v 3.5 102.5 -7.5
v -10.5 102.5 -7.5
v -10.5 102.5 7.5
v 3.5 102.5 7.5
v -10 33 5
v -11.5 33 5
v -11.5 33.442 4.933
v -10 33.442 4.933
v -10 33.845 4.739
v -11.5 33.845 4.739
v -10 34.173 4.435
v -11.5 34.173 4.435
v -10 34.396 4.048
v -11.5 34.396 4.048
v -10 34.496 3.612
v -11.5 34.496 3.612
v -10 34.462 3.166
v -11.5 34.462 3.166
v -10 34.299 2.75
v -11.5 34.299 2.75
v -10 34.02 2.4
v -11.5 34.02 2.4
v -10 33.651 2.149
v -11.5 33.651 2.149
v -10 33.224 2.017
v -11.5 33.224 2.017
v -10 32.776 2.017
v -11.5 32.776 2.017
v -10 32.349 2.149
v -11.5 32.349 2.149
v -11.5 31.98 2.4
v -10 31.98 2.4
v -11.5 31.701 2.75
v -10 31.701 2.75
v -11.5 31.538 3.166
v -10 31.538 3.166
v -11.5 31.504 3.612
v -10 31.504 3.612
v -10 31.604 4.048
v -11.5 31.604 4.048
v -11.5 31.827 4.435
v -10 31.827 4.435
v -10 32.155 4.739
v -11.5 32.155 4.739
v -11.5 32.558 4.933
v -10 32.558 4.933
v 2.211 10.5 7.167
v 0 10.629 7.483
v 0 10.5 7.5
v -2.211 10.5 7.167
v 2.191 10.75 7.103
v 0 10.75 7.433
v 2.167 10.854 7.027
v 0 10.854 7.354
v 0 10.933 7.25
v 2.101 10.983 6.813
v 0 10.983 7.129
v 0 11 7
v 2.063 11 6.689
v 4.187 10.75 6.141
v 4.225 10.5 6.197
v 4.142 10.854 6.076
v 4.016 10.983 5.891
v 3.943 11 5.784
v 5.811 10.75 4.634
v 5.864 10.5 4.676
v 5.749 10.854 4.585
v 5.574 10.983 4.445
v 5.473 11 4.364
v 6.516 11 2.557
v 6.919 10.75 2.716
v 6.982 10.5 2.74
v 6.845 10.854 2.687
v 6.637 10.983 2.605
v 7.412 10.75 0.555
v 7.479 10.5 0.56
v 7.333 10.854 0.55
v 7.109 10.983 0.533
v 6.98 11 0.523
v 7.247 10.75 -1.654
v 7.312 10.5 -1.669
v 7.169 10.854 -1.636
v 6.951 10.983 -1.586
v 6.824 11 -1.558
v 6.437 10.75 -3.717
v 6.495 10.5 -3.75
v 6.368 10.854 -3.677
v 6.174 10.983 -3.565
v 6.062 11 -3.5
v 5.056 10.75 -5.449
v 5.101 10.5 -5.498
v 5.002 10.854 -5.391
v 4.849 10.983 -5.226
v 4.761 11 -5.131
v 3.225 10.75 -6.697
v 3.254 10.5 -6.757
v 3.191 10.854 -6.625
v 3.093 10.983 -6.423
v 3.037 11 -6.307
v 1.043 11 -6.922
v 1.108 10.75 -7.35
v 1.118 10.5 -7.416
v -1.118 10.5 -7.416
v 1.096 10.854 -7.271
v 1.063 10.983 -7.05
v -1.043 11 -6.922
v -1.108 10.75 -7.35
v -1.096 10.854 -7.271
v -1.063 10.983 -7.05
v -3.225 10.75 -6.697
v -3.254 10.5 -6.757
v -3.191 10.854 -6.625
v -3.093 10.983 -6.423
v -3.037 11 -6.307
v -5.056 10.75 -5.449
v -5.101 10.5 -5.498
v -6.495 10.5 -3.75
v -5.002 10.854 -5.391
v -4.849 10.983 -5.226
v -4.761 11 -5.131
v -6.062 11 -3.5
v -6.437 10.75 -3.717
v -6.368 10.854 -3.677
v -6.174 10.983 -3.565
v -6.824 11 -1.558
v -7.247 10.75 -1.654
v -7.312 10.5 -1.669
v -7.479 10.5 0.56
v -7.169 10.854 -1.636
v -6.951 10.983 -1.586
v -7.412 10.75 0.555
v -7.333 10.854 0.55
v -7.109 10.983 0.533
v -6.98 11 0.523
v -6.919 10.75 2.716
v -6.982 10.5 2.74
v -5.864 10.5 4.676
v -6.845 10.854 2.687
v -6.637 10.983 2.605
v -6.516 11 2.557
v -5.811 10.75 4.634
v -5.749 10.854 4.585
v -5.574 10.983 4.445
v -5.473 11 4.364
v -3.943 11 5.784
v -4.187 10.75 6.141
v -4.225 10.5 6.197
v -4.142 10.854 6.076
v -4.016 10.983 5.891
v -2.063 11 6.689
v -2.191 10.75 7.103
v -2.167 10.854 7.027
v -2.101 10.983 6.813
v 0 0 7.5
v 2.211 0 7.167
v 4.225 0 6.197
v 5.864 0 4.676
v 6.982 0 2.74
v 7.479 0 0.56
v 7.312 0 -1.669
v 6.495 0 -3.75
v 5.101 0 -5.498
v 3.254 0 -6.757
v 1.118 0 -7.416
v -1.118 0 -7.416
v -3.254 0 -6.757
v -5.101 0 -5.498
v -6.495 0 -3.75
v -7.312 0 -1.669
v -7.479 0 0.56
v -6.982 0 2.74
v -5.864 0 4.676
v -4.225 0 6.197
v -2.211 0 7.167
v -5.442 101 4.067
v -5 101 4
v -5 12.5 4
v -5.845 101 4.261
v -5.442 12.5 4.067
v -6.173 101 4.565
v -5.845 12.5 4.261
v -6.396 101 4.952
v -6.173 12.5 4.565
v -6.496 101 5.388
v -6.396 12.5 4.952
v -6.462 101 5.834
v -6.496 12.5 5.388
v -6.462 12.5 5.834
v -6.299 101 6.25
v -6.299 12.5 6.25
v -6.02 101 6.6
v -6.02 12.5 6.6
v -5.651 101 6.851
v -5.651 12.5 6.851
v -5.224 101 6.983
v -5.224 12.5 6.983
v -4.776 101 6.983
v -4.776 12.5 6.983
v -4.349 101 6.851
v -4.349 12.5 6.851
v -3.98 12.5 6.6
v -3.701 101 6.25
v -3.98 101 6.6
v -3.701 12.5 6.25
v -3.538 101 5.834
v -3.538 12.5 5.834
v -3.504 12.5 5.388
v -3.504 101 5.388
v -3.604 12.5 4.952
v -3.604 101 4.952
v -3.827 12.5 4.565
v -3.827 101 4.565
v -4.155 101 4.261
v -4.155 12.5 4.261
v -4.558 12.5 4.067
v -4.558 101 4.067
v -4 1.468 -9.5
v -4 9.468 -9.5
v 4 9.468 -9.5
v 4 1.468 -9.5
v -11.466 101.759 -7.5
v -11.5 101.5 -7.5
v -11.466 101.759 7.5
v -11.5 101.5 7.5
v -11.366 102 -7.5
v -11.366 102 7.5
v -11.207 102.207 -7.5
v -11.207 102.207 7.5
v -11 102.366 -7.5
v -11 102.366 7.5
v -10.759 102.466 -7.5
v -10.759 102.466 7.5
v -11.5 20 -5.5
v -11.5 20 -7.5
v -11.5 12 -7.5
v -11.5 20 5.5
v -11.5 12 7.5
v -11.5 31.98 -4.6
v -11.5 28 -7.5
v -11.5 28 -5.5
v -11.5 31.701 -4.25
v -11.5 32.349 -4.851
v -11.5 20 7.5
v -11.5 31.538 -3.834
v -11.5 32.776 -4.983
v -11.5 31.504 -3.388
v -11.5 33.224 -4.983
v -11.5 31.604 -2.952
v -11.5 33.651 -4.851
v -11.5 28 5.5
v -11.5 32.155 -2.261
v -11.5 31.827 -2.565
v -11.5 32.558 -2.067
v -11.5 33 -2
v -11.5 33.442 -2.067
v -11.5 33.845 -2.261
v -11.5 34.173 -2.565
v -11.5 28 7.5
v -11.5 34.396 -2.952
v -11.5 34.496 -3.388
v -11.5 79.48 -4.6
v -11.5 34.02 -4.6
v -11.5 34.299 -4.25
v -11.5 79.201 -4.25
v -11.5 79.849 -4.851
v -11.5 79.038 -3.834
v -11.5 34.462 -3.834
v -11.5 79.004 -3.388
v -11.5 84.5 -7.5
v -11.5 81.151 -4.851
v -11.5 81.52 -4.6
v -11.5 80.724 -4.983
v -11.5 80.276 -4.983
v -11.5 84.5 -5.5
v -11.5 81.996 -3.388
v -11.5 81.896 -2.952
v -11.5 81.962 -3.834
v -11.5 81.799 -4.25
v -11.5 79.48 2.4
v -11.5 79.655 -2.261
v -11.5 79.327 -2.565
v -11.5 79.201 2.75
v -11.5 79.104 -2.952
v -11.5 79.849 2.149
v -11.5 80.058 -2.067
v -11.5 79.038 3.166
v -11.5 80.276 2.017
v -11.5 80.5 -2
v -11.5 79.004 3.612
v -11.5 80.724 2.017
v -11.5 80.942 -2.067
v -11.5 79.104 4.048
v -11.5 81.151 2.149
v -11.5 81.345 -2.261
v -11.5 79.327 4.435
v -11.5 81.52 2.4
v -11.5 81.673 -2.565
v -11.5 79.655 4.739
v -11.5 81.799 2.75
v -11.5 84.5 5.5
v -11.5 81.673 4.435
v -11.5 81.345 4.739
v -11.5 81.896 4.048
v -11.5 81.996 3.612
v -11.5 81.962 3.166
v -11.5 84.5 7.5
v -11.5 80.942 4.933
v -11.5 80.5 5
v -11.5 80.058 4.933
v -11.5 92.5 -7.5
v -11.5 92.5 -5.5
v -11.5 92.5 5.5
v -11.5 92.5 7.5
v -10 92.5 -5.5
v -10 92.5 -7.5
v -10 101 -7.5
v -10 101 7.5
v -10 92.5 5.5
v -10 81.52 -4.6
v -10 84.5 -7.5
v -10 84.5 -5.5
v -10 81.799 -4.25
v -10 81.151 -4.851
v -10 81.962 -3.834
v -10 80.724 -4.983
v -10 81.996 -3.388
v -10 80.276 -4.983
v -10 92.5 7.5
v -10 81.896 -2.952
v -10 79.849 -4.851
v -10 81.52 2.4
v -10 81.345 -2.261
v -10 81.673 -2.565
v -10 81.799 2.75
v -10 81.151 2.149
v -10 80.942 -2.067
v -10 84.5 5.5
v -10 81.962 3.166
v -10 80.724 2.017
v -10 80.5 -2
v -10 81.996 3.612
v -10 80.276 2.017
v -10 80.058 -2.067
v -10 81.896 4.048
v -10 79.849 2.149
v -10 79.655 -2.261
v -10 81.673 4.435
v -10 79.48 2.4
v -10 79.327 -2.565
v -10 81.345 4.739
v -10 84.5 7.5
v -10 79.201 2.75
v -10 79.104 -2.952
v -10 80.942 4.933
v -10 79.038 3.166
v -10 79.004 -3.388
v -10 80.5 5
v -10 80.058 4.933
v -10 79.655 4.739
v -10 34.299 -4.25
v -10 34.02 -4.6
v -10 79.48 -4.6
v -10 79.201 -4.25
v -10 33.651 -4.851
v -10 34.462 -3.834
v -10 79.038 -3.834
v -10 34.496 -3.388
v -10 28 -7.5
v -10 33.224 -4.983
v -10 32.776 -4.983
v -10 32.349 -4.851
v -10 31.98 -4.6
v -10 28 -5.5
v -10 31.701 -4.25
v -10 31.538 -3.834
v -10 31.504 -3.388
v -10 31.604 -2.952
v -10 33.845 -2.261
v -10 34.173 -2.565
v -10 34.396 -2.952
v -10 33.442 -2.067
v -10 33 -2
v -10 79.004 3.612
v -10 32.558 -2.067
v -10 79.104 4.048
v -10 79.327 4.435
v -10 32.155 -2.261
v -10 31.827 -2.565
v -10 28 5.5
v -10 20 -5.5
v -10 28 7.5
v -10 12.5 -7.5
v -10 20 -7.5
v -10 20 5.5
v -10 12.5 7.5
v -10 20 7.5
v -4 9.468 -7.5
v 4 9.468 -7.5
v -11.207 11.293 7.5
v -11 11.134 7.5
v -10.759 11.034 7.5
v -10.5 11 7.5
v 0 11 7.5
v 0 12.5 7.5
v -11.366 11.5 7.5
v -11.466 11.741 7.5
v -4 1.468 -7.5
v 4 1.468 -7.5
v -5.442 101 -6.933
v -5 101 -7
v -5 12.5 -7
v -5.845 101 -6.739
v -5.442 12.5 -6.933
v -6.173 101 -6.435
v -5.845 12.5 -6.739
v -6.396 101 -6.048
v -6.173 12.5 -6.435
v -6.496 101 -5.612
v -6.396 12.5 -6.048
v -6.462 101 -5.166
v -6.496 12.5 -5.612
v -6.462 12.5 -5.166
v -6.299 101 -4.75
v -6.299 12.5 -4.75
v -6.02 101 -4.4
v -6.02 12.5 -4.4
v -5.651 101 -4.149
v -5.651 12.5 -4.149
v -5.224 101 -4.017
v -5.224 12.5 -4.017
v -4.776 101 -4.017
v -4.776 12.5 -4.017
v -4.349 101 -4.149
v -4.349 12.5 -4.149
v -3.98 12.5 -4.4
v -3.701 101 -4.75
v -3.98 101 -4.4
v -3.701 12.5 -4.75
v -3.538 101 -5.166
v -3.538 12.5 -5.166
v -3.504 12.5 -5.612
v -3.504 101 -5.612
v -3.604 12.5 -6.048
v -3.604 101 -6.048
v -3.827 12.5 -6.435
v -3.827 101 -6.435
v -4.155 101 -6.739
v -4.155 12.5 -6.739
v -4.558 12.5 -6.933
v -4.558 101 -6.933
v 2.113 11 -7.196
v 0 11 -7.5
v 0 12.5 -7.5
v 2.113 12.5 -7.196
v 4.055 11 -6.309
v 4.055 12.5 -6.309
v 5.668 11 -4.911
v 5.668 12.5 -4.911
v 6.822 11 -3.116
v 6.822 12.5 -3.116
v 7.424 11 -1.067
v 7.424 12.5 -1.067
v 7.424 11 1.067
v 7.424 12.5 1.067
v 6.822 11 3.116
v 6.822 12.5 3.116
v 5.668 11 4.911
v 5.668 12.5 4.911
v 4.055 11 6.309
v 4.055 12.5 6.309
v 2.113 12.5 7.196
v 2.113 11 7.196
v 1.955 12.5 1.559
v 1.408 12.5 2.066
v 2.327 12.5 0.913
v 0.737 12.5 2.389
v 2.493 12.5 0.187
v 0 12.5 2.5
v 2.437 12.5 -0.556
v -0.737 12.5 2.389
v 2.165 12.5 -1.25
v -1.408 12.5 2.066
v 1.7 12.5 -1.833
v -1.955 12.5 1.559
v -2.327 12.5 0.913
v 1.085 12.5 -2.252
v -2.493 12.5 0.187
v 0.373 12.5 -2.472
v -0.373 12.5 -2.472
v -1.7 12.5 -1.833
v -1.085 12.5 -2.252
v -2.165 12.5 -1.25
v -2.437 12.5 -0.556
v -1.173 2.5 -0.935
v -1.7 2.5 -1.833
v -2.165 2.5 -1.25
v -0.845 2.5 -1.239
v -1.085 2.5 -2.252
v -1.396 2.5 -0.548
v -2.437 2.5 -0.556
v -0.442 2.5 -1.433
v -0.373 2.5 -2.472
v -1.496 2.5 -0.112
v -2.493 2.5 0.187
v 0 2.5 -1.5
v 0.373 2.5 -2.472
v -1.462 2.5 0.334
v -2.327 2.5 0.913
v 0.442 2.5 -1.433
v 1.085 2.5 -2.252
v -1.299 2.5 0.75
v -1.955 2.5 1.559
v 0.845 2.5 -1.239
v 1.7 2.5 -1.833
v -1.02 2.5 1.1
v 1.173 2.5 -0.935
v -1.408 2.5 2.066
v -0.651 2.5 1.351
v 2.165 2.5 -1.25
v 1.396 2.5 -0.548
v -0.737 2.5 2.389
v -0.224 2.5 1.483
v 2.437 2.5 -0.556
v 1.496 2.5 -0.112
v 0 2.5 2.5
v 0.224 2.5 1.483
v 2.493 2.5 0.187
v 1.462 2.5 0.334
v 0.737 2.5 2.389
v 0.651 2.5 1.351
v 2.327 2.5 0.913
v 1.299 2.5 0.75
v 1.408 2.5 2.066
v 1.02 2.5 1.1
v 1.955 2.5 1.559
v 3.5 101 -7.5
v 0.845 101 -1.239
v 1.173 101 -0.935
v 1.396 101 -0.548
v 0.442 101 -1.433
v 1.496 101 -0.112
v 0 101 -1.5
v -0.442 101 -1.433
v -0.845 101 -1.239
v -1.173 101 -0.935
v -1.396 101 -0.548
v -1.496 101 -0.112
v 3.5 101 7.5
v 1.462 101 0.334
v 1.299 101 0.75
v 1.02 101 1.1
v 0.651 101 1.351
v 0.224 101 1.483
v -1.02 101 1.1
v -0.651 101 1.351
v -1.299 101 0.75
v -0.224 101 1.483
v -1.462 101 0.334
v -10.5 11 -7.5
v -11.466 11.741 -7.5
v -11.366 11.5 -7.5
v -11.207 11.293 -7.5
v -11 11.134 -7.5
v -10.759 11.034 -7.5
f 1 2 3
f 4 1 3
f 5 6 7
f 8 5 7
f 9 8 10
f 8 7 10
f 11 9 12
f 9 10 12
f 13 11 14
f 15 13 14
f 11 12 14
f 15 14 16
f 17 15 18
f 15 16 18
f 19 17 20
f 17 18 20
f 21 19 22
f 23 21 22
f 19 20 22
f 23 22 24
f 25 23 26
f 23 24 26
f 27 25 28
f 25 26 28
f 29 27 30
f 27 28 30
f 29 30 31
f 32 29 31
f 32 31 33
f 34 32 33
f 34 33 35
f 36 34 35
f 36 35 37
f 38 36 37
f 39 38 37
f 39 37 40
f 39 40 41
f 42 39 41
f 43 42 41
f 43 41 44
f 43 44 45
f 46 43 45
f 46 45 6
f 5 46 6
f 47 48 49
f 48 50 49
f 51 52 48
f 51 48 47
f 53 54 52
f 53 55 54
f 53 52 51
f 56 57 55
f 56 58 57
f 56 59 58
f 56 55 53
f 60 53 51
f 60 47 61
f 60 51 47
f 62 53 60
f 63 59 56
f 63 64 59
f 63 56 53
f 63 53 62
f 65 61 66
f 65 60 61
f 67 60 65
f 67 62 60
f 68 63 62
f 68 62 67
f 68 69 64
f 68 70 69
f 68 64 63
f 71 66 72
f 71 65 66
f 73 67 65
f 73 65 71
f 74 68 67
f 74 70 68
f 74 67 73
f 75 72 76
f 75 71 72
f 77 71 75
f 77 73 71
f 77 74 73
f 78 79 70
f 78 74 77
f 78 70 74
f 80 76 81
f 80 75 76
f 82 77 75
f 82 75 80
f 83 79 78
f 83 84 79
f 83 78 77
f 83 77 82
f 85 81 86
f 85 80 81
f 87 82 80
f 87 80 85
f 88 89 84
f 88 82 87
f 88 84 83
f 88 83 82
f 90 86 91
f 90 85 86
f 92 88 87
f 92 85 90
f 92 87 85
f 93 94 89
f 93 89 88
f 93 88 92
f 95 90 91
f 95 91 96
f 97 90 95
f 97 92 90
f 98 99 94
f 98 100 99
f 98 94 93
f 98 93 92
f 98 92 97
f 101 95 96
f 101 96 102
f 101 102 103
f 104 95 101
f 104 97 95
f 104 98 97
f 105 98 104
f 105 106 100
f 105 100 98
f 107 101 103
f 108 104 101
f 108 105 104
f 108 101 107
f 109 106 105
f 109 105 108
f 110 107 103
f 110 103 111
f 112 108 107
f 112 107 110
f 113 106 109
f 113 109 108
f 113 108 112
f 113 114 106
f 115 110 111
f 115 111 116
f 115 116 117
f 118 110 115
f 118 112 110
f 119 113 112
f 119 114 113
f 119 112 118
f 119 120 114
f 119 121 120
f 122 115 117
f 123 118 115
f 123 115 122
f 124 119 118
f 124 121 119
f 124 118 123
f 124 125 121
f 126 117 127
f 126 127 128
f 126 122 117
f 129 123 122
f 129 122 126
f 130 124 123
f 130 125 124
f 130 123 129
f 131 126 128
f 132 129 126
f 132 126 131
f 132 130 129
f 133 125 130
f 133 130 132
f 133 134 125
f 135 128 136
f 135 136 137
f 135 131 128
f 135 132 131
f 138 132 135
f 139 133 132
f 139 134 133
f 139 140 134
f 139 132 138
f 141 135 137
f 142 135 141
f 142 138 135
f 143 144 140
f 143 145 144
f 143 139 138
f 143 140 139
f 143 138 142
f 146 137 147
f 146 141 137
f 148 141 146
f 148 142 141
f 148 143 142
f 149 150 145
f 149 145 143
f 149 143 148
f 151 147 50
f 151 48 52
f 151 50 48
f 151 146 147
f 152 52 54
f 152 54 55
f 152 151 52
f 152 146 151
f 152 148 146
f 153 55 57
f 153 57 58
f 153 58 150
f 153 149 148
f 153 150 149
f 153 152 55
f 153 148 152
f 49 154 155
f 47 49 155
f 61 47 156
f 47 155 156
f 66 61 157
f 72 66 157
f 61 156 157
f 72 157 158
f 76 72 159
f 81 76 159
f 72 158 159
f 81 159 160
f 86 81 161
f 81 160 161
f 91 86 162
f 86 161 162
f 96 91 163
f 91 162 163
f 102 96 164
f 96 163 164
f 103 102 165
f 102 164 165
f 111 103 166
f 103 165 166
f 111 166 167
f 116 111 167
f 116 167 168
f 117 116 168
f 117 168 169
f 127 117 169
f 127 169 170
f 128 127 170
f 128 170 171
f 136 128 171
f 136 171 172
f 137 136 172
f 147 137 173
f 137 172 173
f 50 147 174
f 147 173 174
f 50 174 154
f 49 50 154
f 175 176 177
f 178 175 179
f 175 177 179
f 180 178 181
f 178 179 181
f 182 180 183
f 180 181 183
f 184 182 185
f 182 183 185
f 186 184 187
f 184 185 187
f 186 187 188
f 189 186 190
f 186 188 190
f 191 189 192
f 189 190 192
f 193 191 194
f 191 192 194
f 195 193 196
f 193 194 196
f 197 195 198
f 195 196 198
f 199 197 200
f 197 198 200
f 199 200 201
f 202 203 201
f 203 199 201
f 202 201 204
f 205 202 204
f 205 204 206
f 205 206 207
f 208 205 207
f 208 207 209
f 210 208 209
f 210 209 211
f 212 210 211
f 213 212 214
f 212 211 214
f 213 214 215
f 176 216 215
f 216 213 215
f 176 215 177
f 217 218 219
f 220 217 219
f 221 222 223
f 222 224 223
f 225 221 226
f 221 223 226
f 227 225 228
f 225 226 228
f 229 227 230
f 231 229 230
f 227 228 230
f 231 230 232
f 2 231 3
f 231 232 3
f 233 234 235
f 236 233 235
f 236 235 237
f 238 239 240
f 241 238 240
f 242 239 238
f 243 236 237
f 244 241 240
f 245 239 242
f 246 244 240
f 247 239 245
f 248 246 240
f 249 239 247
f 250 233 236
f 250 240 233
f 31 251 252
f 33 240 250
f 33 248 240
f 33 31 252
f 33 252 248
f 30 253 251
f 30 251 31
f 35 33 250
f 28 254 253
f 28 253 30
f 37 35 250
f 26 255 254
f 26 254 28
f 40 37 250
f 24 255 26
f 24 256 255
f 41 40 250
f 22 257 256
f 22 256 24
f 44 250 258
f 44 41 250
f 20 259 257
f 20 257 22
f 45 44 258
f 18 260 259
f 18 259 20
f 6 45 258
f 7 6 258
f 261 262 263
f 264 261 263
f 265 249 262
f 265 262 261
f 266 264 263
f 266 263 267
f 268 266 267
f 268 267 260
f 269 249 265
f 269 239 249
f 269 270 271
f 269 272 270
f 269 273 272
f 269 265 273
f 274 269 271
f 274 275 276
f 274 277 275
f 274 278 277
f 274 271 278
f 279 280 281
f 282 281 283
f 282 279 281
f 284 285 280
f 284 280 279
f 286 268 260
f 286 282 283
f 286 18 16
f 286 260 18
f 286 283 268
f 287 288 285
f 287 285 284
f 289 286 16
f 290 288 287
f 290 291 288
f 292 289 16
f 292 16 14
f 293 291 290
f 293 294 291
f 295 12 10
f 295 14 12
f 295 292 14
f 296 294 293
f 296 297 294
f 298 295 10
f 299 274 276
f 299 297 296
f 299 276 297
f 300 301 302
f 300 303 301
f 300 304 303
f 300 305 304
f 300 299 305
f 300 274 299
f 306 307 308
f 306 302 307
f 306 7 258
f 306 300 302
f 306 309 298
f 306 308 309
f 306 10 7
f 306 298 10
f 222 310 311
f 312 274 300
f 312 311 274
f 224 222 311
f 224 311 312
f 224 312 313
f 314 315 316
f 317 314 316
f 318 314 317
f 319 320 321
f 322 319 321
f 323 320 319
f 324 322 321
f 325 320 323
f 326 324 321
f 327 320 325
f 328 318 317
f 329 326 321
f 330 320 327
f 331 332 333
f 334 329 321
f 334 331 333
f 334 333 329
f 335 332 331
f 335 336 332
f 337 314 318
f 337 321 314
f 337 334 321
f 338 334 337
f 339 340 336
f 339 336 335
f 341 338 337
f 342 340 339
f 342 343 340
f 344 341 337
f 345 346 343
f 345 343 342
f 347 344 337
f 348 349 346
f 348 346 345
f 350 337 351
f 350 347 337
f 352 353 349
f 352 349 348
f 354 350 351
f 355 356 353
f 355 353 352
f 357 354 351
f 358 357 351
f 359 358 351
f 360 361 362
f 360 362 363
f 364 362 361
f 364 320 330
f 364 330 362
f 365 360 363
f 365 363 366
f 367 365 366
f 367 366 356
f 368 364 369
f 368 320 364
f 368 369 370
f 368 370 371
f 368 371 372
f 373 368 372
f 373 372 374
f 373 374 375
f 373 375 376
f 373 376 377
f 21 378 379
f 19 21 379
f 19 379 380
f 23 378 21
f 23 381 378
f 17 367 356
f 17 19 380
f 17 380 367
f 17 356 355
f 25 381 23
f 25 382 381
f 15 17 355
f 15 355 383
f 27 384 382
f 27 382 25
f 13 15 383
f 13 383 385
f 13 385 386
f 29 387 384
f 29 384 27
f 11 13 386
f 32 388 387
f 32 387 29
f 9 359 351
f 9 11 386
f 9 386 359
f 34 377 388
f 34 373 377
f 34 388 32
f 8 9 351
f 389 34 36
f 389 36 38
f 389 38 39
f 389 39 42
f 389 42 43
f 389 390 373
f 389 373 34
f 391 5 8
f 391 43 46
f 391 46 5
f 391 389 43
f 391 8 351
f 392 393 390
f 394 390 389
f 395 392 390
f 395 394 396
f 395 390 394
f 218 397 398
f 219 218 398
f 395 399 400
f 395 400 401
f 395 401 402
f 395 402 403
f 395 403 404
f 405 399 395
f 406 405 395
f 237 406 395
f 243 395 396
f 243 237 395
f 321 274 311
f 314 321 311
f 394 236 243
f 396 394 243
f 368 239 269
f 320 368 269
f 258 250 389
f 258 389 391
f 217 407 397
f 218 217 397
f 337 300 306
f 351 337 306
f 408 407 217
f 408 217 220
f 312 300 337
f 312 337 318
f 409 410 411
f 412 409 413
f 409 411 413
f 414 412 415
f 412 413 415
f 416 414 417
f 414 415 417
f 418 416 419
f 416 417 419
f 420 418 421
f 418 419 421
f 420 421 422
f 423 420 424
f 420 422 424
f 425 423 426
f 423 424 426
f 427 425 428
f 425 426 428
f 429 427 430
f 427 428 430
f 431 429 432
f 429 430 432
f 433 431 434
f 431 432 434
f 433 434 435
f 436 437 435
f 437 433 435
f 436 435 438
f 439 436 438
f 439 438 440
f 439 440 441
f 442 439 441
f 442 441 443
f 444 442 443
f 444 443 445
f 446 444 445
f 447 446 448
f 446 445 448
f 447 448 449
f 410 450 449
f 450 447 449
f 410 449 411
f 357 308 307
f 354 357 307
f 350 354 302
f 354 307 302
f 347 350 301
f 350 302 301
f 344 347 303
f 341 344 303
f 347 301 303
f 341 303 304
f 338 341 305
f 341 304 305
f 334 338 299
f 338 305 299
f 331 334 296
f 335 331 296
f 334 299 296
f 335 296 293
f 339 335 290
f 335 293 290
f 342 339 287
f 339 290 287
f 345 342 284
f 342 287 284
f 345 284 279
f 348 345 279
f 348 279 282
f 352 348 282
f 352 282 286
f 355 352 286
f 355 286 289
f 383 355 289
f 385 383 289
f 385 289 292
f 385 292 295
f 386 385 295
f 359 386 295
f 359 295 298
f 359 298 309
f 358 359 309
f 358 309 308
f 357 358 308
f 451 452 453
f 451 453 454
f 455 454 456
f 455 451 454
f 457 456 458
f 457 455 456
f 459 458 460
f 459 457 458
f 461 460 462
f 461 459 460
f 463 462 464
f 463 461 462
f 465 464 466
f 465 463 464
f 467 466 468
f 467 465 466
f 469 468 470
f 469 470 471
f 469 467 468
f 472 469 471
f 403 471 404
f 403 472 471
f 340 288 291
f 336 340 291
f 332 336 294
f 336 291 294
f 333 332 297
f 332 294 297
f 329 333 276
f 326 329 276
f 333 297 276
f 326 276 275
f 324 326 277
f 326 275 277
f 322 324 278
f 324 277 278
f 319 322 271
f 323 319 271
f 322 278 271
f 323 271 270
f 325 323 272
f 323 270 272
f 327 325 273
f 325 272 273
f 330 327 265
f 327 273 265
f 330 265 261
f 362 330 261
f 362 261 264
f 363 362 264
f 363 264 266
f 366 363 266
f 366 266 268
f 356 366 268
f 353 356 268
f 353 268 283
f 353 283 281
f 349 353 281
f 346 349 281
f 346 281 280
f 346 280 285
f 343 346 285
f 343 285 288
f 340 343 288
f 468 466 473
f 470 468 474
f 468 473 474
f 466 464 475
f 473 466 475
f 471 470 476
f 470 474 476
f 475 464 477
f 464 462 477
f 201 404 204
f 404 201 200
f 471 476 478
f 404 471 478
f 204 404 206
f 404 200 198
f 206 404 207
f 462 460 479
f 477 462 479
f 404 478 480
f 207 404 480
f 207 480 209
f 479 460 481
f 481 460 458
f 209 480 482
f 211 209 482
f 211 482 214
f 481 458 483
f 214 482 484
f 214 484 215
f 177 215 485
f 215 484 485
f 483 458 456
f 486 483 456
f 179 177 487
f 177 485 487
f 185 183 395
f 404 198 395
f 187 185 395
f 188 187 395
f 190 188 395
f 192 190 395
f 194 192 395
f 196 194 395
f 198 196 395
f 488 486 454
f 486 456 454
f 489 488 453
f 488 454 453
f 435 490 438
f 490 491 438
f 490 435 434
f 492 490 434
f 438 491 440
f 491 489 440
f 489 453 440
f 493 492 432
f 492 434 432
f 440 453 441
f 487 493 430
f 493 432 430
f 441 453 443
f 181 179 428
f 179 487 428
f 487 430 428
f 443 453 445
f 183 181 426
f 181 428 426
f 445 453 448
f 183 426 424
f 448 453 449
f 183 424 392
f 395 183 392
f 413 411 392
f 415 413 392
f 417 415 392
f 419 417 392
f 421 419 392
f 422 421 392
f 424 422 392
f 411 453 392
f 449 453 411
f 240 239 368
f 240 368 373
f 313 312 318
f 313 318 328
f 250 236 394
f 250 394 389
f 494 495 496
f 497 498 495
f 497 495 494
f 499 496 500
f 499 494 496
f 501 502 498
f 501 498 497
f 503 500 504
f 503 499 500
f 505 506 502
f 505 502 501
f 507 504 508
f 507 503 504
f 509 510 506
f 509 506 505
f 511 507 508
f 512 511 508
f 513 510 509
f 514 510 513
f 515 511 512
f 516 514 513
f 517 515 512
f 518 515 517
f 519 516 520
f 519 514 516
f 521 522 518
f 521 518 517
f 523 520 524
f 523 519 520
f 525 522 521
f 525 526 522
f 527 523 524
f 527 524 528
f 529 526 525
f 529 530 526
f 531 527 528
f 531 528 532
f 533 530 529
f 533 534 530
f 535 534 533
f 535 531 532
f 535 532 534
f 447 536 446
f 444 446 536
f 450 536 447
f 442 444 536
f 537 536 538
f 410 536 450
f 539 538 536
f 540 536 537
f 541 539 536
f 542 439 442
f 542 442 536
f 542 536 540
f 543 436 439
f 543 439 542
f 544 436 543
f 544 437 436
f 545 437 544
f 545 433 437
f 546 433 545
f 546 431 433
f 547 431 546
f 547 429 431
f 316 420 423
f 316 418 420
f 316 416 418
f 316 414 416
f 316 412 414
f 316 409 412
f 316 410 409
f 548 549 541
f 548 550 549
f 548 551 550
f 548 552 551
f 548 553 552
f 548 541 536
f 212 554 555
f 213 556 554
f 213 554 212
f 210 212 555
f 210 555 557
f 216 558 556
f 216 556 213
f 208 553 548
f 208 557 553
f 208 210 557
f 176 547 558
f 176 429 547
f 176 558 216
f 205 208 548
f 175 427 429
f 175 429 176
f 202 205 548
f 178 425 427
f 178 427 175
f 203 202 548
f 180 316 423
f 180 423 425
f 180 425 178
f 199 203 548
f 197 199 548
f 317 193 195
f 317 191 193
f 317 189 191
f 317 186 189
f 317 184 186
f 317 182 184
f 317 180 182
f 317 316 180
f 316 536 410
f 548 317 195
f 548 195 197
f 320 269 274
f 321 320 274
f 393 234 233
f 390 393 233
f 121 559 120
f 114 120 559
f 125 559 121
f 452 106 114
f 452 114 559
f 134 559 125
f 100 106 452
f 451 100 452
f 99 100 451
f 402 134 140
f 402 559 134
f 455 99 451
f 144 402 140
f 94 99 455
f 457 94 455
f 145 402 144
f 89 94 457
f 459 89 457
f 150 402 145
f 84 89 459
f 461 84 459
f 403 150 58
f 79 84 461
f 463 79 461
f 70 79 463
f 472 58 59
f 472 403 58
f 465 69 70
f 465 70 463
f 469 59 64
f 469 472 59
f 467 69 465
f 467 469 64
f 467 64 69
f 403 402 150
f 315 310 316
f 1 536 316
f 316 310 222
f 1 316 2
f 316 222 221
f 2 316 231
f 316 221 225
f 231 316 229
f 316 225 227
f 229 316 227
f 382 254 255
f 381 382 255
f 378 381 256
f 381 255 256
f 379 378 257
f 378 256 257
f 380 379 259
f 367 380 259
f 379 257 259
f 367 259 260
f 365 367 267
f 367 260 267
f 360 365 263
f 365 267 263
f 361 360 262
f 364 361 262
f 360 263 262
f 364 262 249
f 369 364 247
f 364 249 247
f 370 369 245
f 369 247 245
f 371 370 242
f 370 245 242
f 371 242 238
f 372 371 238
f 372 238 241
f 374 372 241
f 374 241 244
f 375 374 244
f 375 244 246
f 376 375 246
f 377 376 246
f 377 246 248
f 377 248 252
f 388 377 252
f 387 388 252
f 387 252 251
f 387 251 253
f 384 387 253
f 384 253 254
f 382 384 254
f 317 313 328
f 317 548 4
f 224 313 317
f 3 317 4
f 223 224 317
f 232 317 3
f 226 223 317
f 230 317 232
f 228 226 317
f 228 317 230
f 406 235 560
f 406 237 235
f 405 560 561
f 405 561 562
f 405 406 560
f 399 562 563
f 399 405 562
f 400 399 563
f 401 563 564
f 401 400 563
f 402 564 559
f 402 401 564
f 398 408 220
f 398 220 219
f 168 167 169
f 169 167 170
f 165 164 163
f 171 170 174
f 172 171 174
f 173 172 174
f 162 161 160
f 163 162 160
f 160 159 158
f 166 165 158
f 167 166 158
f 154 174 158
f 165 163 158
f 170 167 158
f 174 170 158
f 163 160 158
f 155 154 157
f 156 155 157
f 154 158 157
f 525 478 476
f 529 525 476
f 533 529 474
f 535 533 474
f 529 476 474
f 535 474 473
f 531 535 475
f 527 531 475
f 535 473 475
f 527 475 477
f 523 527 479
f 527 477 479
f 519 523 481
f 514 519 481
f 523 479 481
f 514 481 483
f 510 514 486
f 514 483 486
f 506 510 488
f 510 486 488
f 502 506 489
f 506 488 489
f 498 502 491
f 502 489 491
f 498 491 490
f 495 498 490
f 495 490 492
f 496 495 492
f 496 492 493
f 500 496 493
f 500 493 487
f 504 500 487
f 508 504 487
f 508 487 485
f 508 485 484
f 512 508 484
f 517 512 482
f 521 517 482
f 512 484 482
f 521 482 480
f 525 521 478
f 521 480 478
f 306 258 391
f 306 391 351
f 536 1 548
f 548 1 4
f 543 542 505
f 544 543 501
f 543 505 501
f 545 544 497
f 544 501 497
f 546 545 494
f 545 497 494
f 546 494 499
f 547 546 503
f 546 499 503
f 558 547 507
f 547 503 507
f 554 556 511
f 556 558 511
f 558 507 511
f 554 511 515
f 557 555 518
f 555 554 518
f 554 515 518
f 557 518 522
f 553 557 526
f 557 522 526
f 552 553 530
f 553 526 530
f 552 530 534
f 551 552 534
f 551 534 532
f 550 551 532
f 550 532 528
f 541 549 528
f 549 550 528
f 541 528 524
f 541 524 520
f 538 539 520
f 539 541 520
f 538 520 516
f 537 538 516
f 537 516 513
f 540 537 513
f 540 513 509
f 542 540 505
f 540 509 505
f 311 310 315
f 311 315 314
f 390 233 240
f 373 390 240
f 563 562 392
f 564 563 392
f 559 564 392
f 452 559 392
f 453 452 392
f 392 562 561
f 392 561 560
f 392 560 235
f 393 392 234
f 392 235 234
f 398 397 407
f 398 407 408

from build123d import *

# Parameters (mm, degrees)
SKETCH1_R           = 7.5
BOSS_EXTRUDE1_DEPTH = 11
FILLET1_R           = 0.5
BOSS_EXTRUDE2_DEPTH = 1.5
SKETCH5_W           = 1.5
SKETCH5_H           = 15
BOSS_EXTRUDE3_DEPTH = 90
FILLET2_R           = 1
SKETCH7_W           = 15
SKETCH7_H           = 1.5
BOSS_EXTRUDE4_DEPTH = 15
FILLET3_R           = 1
SKETCH8_R           = 2.5
CUT_EXTRUDE1_DEPTH  = 10
SKETCH9_R           = 1.5
BOSS_EXTRUDE5_DEPTH = 90
SKETCH10_R          = 1.5
BOSS_EXTRUDE6_DEPTH = 99
SKETCH11_R          = 1.5
CUT_EXTRUDE2_DEPTH  = 2
SKETCH12_W          = 2
SKETCH12_H          = 8
CUT_EXTRUDE3_DEPTH  = 2
SKETCH13_W          = 8
SKETCH13_H          = 8
BOSS_EXTRUDE7_DEPTH = 2


with BuildPart() as part:
    # Sketch1 → Boss-Extrude1 (new body)
    with BuildSketch(Plane(origin=(0, 0, 0), x_dir=(1, 0, 0), z_dir=(0, 1, 0))):
        with Locations(Location((0, 0, 0), (0, 0, 270))):
            Circle(SKETCH1_R)
    extrude(amount=BOSS_EXTRUDE1_DEPTH)

    # Fillet1
    fillet1_edges = [part.edges().sort_by_distance(p)[0] for p in [
        (0, 11, -7.5),
    ]]
    fillet(fillet1_edges, radius=FILLET1_R)

    # Sketch3 → Boss-Extrude2 (add)
    with BuildSketch(Plane(origin=(0, 11, 0), x_dir=(1, 0, 0), z_dir=(0, 1, 0))):
        with BuildLine():
            Line((0, -7.5), (-10, -7.5))
            Line((-10, -7.5), (-10, 7.5))
            Line((-10, 7.5), (0, 7.5))
            ThreePointArc((0, 7.5), (7.5, 0), (0, -7.5))
        make_face()
    extrude(amount=BOSS_EXTRUDE2_DEPTH)

    # Sketch5 → Boss-Extrude3 (add)
    with BuildSketch(Plane.XZ.offset(-11)):
        with Locations((-10.75, 0)):
            Rectangle(SKETCH5_W, SKETCH5_H)
    extrude(amount=-BOSS_EXTRUDE3_DEPTH)

    # Fillet2
    fillet2_edges = [part.edges().sort_by_distance(p)[0] for p in [
        (-11.5, 11, 0),
    ]]
    fillet(fillet2_edges, radius=FILLET2_R)

    # Sketch7 → Boss-Extrude4 (add)
    with BuildSketch(Plane.ZY.offset(11.5)):
        with Locations((0, 101.75)):
            Rectangle(SKETCH7_W, SKETCH7_H)
    extrude(amount=-BOSS_EXTRUDE4_DEPTH)

    # Fillet3
    fillet3_edges = [part.edges().sort_by_distance(p)[0] for p in [
        (-11.5, 102.5, 0),
    ]]
    fillet(fillet3_edges, radius=FILLET3_R)

    # Sketch8 → Cut-Extrude1 (cut)
    with BuildSketch(Plane(origin=(0, 12.5, 0), x_dir=(1, 0, 0), z_dir=(0, 1, 0))):
        with Locations(Location((0, 0, 0), (0, 0, 270))):
            Circle(SKETCH8_R)
    extrude(amount=-CUT_EXTRUDE1_DEPTH, mode=Mode.SUBTRACT)

    # Sketch9 → Boss-Extrude5 (add)
    with BuildSketch(Plane(origin=(0, 12.5, 0), x_dir=(1, 0, 0), z_dir=(0, 1, 0))):
        with Locations(Location((-5, 5.5, 0), (0, 0, 90))):
            Circle(SKETCH9_R)
        with Locations(Location((-5, -5.5, 0), (0, 0, 90))):
            Circle(SKETCH9_R)
    extrude(amount=BOSS_EXTRUDE5_DEPTH)

    # Sketch10 → Boss-Extrude6 (add)
    with BuildSketch(Plane(origin=(0, 2.5, 0), x_dir=(1, 0, 0), z_dir=(0, 1, 0))):
        with Locations(Location((0, 0, 0), (0, 0, 90))):
            Circle(SKETCH10_R)
    extrude(amount=BOSS_EXTRUDE6_DEPTH)

    # Sketch11 → Cut-Extrude2 (cut)
    with BuildSketch(Plane.ZY.offset(11.5)):
        with Locations((-3.5, 80.5)):
            Circle(SKETCH11_R)
        with Locations((3.5, 80.5)):
            Circle(SKETCH11_R)
        with Locations((-3.5, 33)):
            Circle(SKETCH11_R)
        with Locations((3.5, 33)):
            Circle(SKETCH11_R)
    extrude(amount=-CUT_EXTRUDE2_DEPTH, mode=Mode.SUBTRACT)

    # Sketch12 → Cut-Extrude3 (cut)
    with BuildSketch(Plane.ZY.offset(11.5)):
        with Locations((6.5, 24)):
            Rectangle(SKETCH12_W, SKETCH12_H)
        with Locations((-6.5, 24)):
            Rectangle(SKETCH12_W, SKETCH12_H)
        with Locations((6.5, 88.5)):
            Rectangle(SKETCH12_W, SKETCH12_H)
        with Locations((-6.5, 88.5)):
            Rectangle(SKETCH12_W, SKETCH12_H)
    extrude(amount=-CUT_EXTRUDE3_DEPTH, mode=Mode.SUBTRACT)


with BuildPart() as body_2:
    # Sketch13 → Boss-Extrude7 (new body)
    with BuildSketch(Plane.XY.offset(-7.5)):
        with Locations((0, 5.467961161)):
            Rectangle(SKETCH13_W, SKETCH13_H)
    extrude(amount=-BOSS_EXTRUDE7_DEPTH)


solid = Compound([part.part, body_2.part])
